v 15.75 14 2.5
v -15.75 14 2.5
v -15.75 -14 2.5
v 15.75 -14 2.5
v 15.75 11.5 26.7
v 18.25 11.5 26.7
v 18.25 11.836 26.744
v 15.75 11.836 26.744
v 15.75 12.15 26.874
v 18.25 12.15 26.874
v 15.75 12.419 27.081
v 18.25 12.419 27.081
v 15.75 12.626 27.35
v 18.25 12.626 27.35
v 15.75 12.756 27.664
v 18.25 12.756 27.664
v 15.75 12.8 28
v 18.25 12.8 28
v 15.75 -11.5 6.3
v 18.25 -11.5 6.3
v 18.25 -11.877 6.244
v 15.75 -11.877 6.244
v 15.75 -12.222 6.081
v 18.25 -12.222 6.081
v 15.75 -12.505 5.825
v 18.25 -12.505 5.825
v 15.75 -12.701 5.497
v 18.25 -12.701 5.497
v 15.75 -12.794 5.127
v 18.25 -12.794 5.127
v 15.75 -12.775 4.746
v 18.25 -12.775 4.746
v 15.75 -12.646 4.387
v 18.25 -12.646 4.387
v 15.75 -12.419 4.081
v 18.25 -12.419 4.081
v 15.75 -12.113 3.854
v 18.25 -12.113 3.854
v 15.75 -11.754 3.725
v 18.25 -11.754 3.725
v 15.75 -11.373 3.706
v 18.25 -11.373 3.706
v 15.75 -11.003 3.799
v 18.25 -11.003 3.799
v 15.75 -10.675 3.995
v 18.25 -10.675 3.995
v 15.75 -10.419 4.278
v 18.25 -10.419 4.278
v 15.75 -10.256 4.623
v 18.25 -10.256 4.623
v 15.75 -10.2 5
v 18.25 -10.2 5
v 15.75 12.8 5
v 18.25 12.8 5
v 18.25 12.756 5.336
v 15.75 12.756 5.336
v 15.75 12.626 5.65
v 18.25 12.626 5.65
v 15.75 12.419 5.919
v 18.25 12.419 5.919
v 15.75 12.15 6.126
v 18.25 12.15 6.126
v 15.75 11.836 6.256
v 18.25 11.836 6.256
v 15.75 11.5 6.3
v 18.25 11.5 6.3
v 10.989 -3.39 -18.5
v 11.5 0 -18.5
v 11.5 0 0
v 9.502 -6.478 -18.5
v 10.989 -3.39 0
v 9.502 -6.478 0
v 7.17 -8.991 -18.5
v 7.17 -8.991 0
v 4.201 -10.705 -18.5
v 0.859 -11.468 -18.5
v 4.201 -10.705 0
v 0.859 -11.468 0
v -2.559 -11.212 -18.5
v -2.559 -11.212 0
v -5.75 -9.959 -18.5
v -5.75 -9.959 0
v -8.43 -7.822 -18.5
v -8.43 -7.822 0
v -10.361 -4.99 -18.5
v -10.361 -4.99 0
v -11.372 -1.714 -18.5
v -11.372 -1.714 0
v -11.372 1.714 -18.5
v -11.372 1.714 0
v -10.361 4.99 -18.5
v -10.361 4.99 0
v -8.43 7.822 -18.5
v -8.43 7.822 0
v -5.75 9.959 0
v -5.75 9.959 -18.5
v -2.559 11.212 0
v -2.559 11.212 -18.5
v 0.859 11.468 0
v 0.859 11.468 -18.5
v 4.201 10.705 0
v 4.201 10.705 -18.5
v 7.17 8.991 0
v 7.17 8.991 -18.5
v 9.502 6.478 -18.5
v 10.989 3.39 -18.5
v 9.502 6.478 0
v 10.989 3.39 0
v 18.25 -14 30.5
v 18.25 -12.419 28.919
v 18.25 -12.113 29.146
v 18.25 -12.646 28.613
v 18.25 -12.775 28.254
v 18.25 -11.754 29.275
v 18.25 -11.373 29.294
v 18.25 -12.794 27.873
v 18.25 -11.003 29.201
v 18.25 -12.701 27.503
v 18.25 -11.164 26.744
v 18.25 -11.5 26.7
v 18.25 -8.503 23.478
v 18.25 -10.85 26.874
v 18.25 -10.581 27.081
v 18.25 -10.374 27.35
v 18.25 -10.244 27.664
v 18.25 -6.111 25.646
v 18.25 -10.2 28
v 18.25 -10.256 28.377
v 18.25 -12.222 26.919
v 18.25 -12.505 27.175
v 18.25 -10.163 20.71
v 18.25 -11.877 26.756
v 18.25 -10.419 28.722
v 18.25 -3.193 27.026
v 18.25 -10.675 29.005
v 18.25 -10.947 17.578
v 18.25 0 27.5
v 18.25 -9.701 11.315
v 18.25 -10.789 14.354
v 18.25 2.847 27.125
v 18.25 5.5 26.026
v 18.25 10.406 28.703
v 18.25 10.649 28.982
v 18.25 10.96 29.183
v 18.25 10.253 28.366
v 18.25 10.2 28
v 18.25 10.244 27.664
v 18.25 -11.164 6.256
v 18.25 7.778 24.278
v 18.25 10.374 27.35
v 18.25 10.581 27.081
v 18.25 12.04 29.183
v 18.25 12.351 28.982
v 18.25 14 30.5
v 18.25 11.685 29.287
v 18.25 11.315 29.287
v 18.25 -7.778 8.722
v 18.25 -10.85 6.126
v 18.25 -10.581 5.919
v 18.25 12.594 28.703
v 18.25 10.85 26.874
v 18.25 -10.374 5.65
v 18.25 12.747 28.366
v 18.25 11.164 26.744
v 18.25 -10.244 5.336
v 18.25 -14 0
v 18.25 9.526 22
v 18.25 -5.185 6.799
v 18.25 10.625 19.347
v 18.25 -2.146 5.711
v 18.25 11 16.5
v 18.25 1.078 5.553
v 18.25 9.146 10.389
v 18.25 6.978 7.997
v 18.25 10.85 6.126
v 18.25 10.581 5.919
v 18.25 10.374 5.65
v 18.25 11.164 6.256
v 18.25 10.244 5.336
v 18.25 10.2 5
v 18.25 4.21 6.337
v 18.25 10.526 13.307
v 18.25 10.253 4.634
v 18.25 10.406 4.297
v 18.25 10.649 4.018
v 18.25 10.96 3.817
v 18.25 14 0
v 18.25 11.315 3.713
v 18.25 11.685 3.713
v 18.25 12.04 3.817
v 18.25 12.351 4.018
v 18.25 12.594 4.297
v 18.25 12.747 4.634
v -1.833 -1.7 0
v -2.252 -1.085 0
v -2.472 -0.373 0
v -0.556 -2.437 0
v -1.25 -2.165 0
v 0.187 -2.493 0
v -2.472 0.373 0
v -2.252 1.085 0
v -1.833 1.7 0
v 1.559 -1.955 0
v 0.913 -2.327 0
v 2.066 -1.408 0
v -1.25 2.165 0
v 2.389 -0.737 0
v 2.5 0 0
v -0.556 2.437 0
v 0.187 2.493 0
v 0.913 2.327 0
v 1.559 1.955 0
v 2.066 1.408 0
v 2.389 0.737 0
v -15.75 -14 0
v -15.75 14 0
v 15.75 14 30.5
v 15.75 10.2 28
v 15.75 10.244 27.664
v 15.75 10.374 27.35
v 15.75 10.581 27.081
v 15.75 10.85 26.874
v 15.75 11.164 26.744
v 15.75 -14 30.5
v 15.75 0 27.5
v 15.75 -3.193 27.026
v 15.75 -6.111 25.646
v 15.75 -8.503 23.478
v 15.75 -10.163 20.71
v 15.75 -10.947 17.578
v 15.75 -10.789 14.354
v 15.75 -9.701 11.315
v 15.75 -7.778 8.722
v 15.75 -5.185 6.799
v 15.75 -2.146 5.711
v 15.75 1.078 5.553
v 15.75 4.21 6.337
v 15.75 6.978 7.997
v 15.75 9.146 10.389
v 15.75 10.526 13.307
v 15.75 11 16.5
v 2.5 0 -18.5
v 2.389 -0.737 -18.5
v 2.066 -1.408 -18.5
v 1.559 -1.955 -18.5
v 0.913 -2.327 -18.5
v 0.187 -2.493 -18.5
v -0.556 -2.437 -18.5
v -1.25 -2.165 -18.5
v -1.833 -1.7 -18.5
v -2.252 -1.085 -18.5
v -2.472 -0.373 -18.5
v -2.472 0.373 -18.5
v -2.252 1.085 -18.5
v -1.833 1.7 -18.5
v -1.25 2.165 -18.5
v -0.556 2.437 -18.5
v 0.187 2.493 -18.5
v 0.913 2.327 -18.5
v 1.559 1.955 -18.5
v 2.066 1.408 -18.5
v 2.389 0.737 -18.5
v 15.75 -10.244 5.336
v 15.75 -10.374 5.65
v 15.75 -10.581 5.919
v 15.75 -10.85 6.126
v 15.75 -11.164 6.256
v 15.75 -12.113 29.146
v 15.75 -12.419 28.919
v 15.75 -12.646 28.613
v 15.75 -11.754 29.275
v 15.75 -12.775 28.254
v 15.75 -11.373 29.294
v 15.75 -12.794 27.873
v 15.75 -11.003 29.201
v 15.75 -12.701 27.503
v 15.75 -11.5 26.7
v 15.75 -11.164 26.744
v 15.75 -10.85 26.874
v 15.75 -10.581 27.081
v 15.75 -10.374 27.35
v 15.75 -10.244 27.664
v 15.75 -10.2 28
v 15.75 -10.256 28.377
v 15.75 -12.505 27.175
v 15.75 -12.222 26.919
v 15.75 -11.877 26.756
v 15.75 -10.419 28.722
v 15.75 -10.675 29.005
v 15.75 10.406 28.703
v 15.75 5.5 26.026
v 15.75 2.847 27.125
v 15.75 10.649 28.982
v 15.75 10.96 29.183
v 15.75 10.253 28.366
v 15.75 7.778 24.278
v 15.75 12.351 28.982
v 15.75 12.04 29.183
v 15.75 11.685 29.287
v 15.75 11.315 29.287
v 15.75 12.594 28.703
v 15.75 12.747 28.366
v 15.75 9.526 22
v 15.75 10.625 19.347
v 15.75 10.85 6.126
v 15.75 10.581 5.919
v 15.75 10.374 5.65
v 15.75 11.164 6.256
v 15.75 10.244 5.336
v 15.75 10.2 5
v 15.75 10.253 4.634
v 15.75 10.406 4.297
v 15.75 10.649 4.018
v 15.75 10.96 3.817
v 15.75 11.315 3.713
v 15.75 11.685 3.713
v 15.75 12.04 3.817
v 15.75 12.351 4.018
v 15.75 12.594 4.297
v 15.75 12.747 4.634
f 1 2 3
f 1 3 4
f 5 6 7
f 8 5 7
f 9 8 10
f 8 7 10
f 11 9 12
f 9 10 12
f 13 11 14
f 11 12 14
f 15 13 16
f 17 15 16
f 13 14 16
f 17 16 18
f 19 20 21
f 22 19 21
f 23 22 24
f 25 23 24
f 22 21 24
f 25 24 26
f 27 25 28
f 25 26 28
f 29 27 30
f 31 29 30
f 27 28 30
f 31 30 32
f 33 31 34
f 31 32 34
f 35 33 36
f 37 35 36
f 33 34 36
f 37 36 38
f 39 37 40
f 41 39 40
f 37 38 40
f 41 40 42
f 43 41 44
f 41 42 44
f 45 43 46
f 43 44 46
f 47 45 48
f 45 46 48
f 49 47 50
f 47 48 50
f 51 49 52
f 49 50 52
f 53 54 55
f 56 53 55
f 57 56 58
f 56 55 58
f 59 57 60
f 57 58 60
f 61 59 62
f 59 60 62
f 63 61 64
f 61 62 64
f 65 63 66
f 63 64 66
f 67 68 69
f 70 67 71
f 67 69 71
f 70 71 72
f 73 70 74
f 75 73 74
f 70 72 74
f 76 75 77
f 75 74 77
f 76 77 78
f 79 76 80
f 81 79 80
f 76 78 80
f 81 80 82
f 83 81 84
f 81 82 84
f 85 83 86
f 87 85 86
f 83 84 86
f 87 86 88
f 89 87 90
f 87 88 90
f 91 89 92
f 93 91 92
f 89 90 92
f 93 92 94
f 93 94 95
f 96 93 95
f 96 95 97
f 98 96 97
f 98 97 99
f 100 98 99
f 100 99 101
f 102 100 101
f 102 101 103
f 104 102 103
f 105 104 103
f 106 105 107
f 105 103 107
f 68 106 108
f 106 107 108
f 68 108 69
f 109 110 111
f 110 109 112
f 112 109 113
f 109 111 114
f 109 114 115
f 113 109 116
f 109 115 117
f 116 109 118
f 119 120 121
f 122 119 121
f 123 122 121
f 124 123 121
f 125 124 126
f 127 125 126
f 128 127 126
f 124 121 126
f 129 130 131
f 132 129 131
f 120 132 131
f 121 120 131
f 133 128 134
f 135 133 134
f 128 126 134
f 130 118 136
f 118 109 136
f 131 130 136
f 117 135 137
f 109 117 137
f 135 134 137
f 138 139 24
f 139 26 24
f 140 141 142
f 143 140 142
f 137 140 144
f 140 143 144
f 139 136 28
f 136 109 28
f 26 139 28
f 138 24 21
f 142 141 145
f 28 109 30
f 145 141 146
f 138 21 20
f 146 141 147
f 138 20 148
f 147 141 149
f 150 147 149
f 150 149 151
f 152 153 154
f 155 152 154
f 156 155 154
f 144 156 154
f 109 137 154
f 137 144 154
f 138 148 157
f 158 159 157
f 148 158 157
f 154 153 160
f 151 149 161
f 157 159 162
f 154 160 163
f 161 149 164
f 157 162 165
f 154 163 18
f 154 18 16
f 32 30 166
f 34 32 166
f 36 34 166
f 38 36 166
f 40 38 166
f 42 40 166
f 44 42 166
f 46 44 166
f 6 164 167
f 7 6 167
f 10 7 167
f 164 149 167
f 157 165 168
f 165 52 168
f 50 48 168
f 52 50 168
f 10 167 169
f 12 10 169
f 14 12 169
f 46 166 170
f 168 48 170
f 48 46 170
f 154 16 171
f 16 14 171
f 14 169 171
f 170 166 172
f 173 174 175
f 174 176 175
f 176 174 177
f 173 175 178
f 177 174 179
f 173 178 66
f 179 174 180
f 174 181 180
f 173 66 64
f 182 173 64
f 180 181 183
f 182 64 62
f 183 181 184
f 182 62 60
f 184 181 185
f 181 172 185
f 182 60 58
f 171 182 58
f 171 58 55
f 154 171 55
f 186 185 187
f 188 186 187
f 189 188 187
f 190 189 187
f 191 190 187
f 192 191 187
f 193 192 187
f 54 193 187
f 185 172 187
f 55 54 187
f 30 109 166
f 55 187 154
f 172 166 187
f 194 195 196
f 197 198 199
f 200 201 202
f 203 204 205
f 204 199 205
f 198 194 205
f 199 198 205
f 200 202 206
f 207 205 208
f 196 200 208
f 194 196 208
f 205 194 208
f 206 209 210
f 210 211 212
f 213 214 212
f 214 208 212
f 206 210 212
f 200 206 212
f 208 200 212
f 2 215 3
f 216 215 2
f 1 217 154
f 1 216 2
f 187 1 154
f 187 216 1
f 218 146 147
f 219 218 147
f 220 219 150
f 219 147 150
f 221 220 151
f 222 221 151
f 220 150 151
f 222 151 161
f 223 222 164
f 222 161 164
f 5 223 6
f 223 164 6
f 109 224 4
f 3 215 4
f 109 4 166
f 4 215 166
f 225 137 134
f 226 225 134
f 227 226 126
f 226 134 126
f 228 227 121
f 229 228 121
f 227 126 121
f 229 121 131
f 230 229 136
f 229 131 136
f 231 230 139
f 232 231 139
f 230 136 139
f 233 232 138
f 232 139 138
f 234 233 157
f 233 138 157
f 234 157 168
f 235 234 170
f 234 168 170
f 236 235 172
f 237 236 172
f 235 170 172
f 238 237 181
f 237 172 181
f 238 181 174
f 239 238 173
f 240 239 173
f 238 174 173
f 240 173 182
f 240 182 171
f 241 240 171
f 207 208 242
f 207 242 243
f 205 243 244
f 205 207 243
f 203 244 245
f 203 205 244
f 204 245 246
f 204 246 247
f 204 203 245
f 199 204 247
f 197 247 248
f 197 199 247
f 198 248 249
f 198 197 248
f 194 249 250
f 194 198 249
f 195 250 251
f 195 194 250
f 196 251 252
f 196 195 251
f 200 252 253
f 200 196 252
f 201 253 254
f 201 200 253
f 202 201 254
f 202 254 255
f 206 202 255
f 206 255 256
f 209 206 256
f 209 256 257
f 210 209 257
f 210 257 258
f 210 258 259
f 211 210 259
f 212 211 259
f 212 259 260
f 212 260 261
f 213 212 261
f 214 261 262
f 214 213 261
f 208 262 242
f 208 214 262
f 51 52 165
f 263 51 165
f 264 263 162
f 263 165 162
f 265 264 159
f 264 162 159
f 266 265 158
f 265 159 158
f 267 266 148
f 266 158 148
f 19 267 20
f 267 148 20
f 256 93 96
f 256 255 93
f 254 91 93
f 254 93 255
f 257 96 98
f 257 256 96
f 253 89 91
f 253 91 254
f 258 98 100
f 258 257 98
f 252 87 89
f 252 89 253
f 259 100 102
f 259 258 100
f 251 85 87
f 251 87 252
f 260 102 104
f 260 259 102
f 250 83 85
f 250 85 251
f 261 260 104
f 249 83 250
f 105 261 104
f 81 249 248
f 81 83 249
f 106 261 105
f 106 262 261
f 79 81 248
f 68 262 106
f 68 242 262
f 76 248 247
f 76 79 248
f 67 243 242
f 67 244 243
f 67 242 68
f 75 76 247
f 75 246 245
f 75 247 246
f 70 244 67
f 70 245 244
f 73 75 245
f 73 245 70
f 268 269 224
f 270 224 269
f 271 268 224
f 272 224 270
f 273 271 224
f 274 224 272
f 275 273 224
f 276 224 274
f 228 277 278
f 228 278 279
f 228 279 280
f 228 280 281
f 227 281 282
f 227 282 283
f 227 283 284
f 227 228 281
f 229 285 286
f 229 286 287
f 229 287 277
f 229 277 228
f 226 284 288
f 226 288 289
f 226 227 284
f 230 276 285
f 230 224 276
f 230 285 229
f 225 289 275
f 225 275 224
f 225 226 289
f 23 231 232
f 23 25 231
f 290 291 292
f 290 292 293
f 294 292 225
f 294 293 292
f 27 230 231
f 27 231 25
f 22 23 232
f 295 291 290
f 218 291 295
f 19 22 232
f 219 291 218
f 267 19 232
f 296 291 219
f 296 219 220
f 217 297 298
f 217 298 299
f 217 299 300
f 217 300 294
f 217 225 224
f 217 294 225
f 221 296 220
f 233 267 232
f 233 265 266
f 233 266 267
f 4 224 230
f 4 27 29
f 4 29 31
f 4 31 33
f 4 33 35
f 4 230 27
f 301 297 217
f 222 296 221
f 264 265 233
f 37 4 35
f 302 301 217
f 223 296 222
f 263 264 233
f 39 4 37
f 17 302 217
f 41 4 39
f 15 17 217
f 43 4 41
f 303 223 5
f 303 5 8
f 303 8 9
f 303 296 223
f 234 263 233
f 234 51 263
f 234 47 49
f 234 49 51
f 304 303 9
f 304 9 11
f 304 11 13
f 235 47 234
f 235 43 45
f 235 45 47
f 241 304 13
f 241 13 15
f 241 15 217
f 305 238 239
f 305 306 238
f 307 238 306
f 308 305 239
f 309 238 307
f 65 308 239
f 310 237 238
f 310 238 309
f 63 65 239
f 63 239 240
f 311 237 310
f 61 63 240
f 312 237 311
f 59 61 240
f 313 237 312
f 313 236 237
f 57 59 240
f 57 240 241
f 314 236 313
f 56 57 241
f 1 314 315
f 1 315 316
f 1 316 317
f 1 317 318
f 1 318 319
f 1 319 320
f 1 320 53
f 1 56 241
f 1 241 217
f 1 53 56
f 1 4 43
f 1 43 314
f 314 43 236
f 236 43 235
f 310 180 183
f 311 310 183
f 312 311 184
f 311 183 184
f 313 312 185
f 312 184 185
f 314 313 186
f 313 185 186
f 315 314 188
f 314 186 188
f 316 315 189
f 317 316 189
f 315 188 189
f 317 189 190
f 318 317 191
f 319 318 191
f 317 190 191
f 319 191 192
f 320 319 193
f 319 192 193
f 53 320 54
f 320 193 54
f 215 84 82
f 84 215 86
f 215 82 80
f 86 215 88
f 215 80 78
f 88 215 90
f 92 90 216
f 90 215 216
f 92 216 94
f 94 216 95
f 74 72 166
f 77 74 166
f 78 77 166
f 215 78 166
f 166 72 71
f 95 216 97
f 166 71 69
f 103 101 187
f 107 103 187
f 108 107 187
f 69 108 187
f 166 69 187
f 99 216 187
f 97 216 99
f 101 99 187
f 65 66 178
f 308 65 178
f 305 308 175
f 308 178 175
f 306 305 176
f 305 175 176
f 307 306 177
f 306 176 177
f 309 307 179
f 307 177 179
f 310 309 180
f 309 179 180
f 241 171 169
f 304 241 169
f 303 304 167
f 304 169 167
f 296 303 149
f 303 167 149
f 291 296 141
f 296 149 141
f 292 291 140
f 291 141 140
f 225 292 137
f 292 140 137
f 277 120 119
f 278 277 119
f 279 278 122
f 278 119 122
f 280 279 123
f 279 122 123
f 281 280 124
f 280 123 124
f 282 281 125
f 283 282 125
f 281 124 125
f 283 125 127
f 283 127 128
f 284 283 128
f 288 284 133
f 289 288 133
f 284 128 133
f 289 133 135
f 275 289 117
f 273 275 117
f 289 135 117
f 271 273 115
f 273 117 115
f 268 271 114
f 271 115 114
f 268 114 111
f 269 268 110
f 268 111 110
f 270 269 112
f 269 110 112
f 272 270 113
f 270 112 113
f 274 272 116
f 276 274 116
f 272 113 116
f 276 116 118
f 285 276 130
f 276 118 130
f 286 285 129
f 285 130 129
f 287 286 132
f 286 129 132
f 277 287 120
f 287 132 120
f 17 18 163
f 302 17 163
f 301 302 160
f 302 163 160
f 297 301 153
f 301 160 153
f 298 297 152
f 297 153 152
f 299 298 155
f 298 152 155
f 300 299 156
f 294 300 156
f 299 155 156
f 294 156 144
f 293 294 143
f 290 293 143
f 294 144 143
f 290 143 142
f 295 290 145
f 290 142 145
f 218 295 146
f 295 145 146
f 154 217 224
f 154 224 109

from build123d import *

# Parameters (mm, degrees)
F0_W     = 31.5
F0_H     = 28
F1_DEPTH = 2.5
F0_W_2   = 2.5
F2_DEPTH = 30.5
F4_DEPTH = 2.5
F5_R     = 11.5
F5_R_2   = 2.5
F6_DEPTH = 18.5


with BuildPart() as f1:
    # F0 (on Top) → F1 (new body)
    with BuildSketch(Plane.XY):
        Rectangle(F0_W, F0_H)
    extrude(amount=F1_DEPTH)

    # F0 (on Top) → F2 (join)
    with BuildSketch(Plane.XY):
        with Locations((17, 0)):
            Rectangle(F0_W_2, F0_H)
    extrude(amount=F2_DEPTH)

    # F3 (on face) → F4 (cut)
    with BuildSketch(Plane.YZ.offset(18.25)):
        with BuildLine():
            Line((-11.5, 28), (-10.2, 28))
            ThreePointArc((-10.2, 28), (-12.419239, 28.919239), (-11.5, 26.7))
            Line((-11.5, 26.7), (-11.5, 28))
        make_face()
        with BuildLine():
            Line((-11.5, 5), (-11.5, 6.3))
            ThreePointArc((-11.5, 6.3), (-12.419239, 4.080761), (-10.2, 5))
            Line((-10.2, 5), (-11.5, 5))
        make_face()
        with BuildLine():
            ThreePointArc((-10.2, 5), (-10.580761, 5.919239), (-11.5, 6.3))
            Line((-11.5, 6.3), (-11.5, 5))
            Line((-11.5, 5), (-10.2, 5))
        make_face()
        with BuildLine():
            Line((11.5, 5), (11.5, 6.3))
            ThreePointArc((11.5, 6.3), (10.580761, 5.919239), (10.2, 5))
            Line((10.2, 5), (11.5, 5))
        make_face()
        with BuildLine():
            ThreePointArc((12.8, 5), (12.419239, 5.919239), (11.5, 6.3))
            Line((11.5, 6.3), (11.5, 5))
            Line((11.5, 5), (10.2, 5))
            ThreePointArc((10.2, 5), (11.5, 3.7), (12.8, 5))
        make_face()
        with BuildLine():
            ThreePointArc((11, 16.5), (7.778175, 24.278175), (0, 27.5))
            ThreePointArc((0, 27.5), (-7.778175, 8.721825), (11, 16.5))
        make_face()
        with BuildLine():
            ThreePointArc((-11.5, 26.7), (-10.580761, 27.080761), (-10.2, 28))
            Line((-10.2, 28), (-11.5, 28))
            Line((-11.5, 28), (-11.5, 26.7))
        make_face()
        with BuildLine():
            Line((11.5, 28), (10.2, 28))
            ThreePointArc((10.2, 28), (10.580761, 27.080761), (11.5, 26.7))
            Line((11.5, 26.7), (11.5, 28))
        make_face()
        with BuildLine():
            ThreePointArc((12.8, 28), (11.5, 29.3), (10.2, 28))
            Line((10.2, 28), (11.5, 28))
            Line((11.5, 28), (11.5, 26.7))
            ThreePointArc((11.5, 26.7), (12.419239, 27.080761), (12.8, 28))
        make_face()
    extrude(amount=-F4_DEPTH, mode=Mode.SUBTRACT)

    # F5 (on face) → F6 (join)
    with BuildSketch(Plane(origin=(0, 0, 0), x_dir=(1, 0, 0), z_dir=(0, 0, -1))):
        Circle(F5_R)
        Circle(F5_R_2, mode=Mode.SUBTRACT)
    extrude(amount=F6_DEPTH)


solid = f1.part
